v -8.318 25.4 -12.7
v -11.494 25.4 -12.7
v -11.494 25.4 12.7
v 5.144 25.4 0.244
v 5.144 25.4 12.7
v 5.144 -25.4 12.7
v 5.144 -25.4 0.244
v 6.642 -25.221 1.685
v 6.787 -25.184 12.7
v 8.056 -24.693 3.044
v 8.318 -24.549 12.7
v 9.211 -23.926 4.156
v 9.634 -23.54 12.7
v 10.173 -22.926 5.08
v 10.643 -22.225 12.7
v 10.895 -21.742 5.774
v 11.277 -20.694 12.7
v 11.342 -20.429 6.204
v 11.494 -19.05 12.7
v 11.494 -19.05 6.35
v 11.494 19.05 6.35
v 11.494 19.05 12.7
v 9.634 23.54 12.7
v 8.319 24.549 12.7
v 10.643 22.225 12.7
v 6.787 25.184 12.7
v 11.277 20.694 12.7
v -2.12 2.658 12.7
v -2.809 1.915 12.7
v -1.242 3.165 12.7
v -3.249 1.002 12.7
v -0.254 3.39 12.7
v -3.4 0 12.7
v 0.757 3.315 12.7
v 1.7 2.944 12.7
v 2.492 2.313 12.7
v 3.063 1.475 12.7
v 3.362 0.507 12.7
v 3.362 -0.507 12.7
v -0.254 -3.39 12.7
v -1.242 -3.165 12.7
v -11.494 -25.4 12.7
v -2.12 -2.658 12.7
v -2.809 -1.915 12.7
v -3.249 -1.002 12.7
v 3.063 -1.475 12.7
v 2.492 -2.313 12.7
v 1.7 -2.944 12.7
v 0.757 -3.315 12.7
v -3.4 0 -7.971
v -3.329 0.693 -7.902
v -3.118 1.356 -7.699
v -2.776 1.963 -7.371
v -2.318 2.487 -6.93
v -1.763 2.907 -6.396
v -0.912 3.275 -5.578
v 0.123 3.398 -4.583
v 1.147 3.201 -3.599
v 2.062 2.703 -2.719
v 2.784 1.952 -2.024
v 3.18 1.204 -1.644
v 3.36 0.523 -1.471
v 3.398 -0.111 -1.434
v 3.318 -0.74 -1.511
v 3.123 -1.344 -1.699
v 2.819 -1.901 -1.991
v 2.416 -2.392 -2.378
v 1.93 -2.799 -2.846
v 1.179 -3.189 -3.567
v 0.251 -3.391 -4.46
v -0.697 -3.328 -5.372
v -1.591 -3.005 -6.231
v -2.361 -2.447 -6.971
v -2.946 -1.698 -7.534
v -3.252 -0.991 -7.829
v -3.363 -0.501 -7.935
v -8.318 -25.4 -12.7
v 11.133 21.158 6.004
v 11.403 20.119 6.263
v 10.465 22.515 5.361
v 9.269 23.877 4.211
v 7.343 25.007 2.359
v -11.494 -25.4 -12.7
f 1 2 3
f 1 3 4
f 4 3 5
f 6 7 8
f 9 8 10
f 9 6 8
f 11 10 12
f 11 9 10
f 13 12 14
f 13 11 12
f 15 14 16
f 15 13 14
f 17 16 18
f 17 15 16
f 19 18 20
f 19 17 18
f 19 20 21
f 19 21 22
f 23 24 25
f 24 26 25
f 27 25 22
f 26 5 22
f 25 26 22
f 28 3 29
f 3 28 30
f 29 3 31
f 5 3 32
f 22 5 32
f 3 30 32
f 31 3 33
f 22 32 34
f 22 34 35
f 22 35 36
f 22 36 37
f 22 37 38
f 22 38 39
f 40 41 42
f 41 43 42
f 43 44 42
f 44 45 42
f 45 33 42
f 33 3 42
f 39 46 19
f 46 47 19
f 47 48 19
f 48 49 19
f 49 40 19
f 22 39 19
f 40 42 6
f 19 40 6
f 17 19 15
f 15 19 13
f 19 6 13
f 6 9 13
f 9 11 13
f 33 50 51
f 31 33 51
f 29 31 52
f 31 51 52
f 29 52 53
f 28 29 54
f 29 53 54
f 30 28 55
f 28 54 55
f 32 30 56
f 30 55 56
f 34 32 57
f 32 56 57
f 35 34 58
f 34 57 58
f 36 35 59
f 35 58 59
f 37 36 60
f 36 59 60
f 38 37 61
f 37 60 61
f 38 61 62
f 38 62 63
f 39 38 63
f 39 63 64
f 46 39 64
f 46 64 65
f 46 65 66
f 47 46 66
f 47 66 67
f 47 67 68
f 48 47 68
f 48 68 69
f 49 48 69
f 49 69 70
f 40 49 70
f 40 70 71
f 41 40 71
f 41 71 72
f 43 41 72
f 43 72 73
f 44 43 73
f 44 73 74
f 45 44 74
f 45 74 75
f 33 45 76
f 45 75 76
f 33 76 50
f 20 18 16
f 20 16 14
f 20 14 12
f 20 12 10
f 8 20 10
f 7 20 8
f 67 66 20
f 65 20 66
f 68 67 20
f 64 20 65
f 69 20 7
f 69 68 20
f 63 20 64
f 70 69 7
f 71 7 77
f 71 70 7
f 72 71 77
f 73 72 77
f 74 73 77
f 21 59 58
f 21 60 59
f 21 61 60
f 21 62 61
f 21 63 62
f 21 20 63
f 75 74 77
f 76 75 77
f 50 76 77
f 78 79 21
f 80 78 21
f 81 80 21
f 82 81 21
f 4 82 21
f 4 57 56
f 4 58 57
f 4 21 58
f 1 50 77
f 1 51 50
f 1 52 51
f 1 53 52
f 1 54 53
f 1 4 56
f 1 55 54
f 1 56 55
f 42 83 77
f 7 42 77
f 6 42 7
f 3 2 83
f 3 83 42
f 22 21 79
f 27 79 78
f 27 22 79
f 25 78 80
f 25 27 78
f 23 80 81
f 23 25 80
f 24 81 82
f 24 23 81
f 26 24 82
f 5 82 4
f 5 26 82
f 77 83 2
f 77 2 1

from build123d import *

# Parameters (mm, degrees)
F0_W        = 22.987
F0_H        = 25.4
F1_DEPTH    = 25.4
F2_R        = 6.35
F4_D        = 6.8
F5_T1_DEPTH = 140.0532259942


# Not quite as in the source:
# - a fillet or chamfer that OpenCascade refuses, or shapes differently, is made with other operations: its cross-section is extruded or revolved along the edge and cut away or added


with BuildPart() as f1:
    # F0 (on Front) → F1 (new body, symmetric)
    with BuildSketch(Plane.XZ):
        Rectangle(F0_W, F0_H)
    extrude(amount=F1_DEPTH, both=True)

    # F2
    f2_edges = [f1.edges().sort_by_distance(p)[0] for p in [
        (11.4935, 25.4, 0),
        (11.4935, -25.4, 0),
    ]]
    fillet(f2_edges, radius=F2_R)

    # F4 (through all)
    with Locations(Plane.XY.offset(12.7)):
        with Locations((0, 0)):
            Hole(F4_D / 2)

    # F5: chamfer of 19.05 x 19.812 on 1 edges, made by hand

    # F5_s2 → F5_t1 (cut)
    with BuildSketch(Plane.XZ.offset(-70.0266129971)):
        Polygon((11.4935, 6.35), (-8.3185, -12.7), (11.4935, -12.7), align=None)
    extrude(amount=F5_T1_DEPTH, mode=Mode.SUBTRACT)


solid = f1.part
